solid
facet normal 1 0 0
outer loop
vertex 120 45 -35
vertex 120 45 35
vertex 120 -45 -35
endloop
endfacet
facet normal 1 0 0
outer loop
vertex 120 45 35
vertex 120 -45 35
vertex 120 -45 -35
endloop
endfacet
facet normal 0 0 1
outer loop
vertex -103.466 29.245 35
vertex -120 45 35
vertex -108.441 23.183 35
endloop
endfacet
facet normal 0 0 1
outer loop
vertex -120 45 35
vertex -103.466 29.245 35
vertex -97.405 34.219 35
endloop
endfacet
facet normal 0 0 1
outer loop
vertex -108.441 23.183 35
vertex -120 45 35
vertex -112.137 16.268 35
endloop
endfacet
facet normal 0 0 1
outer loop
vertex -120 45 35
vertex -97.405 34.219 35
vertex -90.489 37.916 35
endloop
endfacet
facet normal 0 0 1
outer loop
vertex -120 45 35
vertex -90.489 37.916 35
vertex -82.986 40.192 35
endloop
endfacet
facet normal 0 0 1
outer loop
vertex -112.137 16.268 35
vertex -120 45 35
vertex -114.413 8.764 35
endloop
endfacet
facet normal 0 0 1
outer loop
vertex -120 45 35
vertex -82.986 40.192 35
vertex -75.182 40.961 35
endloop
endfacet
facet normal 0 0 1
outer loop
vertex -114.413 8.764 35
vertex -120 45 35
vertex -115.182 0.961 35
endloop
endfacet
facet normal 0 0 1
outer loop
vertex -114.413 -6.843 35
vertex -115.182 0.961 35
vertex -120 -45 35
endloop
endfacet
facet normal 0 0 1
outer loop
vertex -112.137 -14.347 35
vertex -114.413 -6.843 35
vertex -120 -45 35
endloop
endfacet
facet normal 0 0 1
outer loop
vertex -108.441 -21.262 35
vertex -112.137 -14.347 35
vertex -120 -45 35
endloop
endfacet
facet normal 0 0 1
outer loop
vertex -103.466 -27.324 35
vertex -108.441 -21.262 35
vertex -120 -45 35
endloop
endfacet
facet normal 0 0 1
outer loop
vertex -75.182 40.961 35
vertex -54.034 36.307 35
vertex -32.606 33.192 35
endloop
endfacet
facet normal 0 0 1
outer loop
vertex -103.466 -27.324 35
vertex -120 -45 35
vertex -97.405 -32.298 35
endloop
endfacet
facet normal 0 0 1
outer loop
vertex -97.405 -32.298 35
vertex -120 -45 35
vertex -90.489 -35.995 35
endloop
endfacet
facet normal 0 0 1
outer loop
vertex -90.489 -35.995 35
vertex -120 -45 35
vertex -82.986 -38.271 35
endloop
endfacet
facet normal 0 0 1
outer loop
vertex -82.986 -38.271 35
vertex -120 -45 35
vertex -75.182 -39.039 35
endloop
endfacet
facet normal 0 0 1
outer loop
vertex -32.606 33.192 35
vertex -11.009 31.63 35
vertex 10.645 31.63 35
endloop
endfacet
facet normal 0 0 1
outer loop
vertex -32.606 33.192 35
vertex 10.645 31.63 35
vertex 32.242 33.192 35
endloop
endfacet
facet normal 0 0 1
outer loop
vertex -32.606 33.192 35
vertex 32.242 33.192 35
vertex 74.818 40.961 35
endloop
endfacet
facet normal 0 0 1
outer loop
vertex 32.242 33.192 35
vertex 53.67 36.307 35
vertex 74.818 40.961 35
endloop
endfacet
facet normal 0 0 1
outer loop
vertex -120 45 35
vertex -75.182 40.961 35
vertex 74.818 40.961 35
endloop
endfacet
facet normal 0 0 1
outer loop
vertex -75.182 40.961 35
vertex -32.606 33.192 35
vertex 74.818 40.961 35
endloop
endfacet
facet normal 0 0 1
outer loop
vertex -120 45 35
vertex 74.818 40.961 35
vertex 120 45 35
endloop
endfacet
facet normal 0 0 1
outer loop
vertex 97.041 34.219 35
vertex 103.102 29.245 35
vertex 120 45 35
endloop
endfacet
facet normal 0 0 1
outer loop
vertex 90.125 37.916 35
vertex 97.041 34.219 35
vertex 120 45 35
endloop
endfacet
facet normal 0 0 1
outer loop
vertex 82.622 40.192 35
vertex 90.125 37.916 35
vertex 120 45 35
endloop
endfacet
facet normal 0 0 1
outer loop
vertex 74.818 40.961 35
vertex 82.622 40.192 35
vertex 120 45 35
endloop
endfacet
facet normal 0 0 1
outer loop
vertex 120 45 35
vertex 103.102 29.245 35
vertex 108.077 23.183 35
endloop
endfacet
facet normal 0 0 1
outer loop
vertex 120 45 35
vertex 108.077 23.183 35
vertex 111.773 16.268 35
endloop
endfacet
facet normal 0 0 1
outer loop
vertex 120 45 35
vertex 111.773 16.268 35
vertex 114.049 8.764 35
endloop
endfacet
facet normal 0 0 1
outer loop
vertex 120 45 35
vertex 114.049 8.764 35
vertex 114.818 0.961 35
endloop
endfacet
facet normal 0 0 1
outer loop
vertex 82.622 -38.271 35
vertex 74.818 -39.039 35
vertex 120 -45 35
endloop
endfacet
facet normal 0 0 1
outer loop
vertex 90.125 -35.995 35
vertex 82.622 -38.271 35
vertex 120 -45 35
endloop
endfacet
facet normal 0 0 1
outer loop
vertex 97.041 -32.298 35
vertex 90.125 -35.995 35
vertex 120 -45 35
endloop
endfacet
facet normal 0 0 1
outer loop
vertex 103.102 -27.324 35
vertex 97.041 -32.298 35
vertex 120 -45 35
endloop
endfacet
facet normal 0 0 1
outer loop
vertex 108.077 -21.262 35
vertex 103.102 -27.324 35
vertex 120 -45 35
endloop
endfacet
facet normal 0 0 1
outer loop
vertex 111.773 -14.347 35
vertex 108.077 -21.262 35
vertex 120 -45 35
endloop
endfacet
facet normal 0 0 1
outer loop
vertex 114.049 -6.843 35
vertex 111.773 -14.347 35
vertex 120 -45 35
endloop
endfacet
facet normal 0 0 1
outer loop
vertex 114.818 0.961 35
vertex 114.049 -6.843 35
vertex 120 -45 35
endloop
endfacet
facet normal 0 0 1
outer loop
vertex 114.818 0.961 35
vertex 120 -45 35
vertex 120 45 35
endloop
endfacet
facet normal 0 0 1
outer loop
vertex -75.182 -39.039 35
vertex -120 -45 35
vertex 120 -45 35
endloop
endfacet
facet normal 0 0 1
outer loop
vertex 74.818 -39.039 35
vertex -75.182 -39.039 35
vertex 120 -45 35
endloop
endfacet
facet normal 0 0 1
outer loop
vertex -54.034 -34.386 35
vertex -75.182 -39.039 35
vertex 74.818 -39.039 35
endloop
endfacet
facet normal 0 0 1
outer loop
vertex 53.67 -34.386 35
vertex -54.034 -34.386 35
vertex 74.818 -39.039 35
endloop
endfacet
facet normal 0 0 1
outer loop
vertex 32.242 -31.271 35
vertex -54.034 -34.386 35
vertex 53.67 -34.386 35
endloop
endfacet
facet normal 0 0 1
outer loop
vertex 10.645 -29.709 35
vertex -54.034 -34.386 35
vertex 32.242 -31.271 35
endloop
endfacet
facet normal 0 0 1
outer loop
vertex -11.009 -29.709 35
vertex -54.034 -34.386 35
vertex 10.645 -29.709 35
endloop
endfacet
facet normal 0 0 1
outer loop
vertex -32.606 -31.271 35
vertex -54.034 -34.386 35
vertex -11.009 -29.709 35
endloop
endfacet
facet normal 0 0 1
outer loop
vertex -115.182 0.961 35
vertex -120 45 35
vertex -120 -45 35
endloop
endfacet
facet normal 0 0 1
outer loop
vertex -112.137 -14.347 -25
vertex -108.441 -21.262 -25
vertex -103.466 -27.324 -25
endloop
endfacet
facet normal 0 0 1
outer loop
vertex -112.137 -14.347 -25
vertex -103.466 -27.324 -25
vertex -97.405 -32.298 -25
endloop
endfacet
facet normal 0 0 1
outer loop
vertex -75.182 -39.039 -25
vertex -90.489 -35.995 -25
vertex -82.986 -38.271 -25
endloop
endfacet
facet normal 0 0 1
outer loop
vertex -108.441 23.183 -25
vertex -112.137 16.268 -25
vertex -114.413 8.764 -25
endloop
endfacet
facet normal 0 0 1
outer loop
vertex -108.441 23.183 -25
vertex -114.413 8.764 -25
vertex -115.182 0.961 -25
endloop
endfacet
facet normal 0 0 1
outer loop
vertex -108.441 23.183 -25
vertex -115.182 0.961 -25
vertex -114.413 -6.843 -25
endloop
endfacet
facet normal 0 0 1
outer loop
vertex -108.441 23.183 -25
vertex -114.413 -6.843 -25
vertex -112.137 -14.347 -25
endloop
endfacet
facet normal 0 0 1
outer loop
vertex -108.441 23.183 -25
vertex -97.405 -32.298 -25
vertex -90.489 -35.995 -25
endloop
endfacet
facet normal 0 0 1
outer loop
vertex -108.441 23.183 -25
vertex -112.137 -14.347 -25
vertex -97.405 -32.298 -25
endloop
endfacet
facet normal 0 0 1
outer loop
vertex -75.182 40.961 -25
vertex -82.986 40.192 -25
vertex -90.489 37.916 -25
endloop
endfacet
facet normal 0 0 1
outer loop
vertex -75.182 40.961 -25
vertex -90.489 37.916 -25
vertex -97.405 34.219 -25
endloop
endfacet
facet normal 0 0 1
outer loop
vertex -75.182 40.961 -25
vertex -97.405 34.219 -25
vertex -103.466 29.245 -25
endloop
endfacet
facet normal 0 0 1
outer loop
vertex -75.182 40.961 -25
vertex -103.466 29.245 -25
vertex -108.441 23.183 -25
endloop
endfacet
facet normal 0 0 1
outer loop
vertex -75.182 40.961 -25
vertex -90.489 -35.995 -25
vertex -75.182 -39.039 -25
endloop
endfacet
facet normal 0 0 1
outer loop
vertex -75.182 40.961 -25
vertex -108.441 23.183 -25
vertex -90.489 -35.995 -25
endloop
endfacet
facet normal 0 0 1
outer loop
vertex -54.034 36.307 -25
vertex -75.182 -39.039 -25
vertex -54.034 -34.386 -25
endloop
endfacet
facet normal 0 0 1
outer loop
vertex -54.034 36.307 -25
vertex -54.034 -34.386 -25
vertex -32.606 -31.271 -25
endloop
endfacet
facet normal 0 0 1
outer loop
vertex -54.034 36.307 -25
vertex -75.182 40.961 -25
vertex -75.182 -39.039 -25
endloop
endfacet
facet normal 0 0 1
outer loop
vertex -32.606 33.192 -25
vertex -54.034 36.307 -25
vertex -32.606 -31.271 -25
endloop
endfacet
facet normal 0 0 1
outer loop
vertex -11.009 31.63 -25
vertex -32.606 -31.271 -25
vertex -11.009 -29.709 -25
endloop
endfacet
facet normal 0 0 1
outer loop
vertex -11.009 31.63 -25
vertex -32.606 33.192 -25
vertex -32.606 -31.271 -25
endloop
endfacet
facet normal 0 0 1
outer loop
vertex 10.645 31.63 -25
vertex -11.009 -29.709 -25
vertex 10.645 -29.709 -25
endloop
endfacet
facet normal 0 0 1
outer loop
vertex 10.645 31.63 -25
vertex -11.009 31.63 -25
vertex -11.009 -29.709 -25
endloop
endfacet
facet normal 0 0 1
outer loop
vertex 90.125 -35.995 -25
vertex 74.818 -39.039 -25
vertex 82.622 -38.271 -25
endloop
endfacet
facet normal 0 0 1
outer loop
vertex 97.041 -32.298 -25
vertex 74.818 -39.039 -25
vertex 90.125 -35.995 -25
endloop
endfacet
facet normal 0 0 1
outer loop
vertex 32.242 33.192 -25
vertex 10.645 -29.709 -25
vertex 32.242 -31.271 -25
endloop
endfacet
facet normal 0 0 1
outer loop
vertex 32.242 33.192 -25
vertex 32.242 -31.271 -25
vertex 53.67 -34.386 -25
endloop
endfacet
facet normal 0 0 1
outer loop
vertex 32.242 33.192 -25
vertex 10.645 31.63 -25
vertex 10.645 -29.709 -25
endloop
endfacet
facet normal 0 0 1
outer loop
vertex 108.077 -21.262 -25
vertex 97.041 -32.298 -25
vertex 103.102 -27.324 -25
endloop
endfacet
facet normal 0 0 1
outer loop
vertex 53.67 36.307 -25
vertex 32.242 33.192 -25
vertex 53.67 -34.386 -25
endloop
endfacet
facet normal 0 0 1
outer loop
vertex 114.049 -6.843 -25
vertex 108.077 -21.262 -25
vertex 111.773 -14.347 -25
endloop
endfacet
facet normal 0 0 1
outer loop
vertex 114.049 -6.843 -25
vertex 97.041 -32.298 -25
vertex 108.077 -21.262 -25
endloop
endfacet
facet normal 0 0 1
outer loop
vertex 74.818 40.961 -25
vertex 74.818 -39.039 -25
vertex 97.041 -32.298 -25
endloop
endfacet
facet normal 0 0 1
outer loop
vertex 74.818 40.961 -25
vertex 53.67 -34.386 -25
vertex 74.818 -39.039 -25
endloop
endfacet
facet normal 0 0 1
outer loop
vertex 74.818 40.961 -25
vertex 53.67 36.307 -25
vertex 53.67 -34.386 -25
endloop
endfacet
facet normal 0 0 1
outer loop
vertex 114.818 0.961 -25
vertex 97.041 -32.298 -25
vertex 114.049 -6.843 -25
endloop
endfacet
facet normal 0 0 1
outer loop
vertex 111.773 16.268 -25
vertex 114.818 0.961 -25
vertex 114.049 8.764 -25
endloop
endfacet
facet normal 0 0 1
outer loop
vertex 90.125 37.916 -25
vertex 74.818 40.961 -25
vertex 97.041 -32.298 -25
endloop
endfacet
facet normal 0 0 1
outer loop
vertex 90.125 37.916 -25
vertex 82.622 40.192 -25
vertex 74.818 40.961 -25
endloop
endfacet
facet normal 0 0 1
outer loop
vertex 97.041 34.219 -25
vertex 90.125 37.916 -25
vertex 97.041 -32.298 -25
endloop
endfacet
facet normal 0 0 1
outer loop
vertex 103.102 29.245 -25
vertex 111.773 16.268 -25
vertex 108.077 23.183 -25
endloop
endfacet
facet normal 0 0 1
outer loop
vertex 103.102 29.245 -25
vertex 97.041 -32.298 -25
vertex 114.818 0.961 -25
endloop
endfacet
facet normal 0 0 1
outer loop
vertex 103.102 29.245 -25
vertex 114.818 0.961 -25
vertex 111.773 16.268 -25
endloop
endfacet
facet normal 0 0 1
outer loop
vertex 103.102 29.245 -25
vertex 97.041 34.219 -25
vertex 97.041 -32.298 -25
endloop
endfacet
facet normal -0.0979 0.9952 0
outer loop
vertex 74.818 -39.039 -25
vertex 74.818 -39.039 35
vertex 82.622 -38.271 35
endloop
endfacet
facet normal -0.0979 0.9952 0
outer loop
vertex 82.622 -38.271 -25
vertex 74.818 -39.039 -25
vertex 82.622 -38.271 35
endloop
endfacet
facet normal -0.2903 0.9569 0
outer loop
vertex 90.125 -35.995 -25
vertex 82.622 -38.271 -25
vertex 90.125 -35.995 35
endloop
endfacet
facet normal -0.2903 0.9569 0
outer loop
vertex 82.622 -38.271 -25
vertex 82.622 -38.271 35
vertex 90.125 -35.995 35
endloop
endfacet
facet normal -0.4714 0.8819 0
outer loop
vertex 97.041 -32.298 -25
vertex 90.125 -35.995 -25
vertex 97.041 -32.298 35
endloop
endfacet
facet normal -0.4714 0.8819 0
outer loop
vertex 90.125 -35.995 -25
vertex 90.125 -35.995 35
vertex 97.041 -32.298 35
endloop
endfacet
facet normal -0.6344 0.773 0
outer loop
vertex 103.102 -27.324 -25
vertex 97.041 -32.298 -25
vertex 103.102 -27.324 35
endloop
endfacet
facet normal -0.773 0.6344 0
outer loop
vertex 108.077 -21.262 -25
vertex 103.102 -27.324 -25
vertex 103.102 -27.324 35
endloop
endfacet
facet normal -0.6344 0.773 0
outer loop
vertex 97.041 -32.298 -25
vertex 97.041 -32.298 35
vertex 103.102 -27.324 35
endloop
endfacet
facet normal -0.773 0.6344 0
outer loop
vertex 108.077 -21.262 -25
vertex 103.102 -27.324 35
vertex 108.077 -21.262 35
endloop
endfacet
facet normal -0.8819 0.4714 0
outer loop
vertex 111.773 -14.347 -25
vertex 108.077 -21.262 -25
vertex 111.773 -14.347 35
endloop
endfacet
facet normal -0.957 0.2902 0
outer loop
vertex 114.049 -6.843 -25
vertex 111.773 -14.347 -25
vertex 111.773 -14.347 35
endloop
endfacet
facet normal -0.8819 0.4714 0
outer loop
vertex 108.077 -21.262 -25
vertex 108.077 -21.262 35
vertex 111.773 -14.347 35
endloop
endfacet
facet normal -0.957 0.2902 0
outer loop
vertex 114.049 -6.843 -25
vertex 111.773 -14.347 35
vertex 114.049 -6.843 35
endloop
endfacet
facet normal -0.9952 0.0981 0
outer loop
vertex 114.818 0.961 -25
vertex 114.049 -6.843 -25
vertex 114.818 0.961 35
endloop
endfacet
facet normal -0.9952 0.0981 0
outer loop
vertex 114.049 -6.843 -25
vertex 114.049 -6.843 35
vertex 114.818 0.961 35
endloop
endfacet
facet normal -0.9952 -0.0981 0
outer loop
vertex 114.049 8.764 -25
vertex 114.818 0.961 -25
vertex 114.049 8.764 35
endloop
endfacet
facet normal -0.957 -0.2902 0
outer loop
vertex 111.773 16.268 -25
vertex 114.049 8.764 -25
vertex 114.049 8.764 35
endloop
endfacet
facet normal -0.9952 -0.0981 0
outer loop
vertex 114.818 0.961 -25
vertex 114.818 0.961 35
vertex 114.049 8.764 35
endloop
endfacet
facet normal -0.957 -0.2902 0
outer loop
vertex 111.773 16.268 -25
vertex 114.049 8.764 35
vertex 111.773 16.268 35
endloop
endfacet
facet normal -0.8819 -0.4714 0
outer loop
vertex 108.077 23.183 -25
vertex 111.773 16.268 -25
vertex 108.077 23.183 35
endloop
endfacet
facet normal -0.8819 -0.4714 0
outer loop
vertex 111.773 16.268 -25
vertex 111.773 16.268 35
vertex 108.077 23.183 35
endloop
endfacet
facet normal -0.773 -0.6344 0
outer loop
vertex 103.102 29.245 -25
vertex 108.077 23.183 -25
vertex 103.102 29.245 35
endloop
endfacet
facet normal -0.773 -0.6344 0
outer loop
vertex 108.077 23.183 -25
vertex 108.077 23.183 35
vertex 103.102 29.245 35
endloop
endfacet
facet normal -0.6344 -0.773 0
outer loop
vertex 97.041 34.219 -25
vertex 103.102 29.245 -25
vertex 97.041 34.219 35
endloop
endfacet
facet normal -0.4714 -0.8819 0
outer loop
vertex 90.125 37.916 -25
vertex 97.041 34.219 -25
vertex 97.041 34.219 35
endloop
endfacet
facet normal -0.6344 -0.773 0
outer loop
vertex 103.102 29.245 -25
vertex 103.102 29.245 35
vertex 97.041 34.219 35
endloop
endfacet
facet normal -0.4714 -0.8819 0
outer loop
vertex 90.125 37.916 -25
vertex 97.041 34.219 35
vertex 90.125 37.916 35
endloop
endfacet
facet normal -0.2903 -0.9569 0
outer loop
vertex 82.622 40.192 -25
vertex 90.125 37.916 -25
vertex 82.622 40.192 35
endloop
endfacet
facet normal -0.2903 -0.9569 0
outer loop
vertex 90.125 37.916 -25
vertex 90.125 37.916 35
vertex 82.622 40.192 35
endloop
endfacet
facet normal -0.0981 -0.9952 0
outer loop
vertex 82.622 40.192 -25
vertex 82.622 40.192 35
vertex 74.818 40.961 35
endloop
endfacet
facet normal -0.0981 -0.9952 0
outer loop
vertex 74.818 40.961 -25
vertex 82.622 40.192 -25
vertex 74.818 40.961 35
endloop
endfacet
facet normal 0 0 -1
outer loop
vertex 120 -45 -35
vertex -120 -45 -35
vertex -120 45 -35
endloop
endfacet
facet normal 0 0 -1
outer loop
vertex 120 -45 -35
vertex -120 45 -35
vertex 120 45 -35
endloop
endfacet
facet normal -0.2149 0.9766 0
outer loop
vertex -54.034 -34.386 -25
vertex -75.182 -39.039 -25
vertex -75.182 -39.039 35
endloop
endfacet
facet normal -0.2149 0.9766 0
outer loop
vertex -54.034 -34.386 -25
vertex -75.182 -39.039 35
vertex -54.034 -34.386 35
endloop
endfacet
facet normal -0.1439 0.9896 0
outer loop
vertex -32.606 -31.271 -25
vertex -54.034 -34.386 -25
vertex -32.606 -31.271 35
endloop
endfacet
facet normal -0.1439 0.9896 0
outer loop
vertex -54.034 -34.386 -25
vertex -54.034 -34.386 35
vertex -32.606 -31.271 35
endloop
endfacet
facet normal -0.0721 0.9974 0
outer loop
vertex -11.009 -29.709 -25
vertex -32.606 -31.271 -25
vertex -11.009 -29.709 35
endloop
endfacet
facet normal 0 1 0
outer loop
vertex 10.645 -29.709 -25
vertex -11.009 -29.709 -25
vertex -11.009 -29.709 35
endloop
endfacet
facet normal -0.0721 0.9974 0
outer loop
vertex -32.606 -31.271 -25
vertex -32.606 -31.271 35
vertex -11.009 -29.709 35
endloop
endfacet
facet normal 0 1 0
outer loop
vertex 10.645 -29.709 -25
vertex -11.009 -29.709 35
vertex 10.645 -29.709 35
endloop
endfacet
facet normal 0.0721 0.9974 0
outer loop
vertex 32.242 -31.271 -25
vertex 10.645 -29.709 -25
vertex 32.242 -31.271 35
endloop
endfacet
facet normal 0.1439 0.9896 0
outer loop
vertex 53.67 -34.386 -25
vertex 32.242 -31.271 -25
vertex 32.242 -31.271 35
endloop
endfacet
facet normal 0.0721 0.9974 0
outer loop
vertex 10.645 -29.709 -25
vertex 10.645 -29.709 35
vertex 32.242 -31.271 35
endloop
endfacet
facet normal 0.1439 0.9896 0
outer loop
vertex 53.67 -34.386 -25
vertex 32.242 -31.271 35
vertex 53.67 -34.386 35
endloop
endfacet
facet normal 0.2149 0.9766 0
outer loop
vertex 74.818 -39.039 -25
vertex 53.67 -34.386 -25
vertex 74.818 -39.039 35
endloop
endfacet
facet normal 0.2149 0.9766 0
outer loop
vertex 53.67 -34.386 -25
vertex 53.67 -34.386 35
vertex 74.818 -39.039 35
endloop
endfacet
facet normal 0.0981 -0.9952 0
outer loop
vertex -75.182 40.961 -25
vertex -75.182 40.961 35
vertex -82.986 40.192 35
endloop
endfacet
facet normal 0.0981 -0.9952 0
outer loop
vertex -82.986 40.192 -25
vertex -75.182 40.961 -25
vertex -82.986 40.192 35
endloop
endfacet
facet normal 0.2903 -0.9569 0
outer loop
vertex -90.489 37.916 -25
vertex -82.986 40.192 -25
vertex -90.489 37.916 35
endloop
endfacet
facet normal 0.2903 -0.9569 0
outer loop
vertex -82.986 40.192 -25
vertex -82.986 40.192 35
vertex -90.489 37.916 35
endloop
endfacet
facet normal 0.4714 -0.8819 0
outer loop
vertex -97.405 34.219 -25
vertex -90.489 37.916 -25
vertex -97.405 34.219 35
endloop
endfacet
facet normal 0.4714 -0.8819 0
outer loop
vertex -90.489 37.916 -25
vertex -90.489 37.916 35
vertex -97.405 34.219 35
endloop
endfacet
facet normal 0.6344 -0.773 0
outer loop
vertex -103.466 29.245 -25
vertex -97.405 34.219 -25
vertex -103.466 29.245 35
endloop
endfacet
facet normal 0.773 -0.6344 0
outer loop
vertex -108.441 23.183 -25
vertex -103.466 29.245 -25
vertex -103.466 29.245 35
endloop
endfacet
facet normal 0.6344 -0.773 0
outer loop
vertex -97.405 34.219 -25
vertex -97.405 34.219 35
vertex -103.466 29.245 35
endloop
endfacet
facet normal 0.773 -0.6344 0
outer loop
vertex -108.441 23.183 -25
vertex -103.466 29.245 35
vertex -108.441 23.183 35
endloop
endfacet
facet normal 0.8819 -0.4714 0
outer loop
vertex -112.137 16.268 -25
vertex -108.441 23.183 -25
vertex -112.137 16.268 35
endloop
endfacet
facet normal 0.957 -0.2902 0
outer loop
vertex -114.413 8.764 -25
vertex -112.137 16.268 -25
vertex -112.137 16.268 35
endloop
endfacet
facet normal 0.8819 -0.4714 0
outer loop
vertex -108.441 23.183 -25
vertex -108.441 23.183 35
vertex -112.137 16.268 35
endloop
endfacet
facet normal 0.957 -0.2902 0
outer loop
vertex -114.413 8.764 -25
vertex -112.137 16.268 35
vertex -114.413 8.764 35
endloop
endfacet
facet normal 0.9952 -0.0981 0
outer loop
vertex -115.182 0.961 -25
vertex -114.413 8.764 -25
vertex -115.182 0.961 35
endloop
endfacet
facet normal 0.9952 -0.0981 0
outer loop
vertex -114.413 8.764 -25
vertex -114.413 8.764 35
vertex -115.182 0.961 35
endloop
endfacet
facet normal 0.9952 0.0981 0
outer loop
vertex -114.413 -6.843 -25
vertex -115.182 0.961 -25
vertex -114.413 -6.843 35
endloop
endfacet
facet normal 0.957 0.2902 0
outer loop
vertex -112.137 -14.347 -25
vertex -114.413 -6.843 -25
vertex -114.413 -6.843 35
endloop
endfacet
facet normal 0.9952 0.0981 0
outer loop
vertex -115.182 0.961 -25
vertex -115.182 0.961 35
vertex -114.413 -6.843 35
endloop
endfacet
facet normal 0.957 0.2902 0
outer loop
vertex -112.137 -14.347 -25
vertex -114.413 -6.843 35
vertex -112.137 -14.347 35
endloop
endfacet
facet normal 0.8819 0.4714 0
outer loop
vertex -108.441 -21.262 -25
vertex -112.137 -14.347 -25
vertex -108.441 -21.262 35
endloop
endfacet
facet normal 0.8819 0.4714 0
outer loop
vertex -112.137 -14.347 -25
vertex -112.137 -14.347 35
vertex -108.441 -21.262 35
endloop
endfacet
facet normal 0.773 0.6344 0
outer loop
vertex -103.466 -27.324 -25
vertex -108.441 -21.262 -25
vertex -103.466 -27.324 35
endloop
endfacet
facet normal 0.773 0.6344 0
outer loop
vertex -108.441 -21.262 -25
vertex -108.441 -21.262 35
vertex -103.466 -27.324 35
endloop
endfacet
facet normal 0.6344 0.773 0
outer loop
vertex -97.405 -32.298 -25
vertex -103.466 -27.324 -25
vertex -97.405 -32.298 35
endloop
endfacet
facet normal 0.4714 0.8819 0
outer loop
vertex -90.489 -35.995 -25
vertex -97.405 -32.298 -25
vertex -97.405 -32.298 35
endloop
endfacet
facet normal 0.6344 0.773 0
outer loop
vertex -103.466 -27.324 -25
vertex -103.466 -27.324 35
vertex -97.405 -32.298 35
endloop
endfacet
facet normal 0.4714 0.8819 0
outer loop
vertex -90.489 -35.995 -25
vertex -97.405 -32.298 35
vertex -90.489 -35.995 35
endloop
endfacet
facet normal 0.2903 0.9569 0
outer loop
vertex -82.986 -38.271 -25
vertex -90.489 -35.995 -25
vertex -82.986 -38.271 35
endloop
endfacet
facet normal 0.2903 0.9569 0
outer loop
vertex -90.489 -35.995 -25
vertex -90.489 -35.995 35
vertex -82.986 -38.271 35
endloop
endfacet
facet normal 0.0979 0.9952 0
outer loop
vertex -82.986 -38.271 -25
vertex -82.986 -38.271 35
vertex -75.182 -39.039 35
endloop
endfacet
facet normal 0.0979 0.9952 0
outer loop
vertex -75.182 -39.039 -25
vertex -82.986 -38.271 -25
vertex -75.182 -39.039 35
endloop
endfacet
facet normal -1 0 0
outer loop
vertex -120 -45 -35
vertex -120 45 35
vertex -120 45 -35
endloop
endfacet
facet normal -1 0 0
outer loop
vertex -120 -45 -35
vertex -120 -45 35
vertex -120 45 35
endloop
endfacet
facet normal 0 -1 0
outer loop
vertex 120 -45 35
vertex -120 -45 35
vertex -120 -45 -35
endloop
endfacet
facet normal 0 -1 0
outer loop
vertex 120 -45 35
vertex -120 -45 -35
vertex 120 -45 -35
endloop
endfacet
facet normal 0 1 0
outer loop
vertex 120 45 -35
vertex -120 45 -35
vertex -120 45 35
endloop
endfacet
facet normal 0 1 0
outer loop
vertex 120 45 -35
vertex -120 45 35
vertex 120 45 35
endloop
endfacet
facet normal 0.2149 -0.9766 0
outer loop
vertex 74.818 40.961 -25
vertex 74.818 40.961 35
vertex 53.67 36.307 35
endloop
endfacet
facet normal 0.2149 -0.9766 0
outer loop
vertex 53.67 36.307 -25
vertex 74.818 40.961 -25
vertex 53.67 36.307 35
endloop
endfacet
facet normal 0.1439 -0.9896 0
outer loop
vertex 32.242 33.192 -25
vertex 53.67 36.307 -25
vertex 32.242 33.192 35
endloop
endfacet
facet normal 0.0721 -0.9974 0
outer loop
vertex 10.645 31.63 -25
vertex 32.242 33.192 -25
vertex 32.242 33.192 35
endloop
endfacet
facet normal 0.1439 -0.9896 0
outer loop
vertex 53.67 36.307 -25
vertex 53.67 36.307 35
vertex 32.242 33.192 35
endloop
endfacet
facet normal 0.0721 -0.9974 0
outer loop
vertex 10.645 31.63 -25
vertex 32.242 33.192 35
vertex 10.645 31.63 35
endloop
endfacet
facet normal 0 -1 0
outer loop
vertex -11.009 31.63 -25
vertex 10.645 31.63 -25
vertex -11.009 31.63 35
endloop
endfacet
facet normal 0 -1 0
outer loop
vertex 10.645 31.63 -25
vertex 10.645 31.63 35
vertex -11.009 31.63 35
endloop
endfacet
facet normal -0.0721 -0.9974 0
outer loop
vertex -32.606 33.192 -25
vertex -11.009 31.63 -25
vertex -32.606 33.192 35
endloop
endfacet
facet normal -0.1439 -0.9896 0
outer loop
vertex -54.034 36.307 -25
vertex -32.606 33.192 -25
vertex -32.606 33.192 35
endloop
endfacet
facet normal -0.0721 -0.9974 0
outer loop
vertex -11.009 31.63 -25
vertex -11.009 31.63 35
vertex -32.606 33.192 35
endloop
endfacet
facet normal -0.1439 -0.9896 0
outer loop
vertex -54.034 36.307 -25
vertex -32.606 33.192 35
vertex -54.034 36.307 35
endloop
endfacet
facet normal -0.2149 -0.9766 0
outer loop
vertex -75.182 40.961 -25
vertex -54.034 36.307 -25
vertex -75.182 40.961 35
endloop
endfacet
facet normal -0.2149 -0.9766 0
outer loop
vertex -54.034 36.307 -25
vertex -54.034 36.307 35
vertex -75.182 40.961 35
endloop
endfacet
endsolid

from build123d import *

# Parameters (mm, degrees)
F0_W      = 240
F0_H      = 70
F1_DEPTH  = 45
F1_FACE_W = 240
F1_FACE_H = 70
F2_DEPTH  = 45
F5_DEPTH  = 60


with BuildPart() as f1:
    # F0 (on Front) → F1 (new body)
    with BuildSketch(Plane.XZ):
        Rectangle(F0_W, F0_H)
    extrude(amount=F1_DEPTH)

    # F1_face (on face) → F2 (join)
    with BuildSketch(Plane(origin=(0, 0, 0), x_dir=(1, 0, 0), z_dir=(0, 1, 0))):
        Rectangle(F1_FACE_W, F1_FACE_H)
    extrude(amount=F2_DEPTH)

    # F4 (on offset) → F5 (cut)
    with BuildSketch(Plane.XY.offset(35)):
        with BuildLine():
            ThreePointArc((-75.18201, -39.039491), (-0.18201, -29.513242), (74.81799, -39.039491))
            ThreePointArc((74.81799, -39.039491), (114.81799, 0.960509), (74.81799, 40.960509))
            ThreePointArc((74.81799, 40.960509), (-0.18201, 31.43426), (-75.18201, 40.960509))
            ThreePointArc((-75.18201, 40.960509), (-115.18201, 0.960509), (-75.18201, -39.039491))
        make_face()
    extrude(amount=-F5_DEPTH, mode=Mode.SUBTRACT)


solid = f1.part
